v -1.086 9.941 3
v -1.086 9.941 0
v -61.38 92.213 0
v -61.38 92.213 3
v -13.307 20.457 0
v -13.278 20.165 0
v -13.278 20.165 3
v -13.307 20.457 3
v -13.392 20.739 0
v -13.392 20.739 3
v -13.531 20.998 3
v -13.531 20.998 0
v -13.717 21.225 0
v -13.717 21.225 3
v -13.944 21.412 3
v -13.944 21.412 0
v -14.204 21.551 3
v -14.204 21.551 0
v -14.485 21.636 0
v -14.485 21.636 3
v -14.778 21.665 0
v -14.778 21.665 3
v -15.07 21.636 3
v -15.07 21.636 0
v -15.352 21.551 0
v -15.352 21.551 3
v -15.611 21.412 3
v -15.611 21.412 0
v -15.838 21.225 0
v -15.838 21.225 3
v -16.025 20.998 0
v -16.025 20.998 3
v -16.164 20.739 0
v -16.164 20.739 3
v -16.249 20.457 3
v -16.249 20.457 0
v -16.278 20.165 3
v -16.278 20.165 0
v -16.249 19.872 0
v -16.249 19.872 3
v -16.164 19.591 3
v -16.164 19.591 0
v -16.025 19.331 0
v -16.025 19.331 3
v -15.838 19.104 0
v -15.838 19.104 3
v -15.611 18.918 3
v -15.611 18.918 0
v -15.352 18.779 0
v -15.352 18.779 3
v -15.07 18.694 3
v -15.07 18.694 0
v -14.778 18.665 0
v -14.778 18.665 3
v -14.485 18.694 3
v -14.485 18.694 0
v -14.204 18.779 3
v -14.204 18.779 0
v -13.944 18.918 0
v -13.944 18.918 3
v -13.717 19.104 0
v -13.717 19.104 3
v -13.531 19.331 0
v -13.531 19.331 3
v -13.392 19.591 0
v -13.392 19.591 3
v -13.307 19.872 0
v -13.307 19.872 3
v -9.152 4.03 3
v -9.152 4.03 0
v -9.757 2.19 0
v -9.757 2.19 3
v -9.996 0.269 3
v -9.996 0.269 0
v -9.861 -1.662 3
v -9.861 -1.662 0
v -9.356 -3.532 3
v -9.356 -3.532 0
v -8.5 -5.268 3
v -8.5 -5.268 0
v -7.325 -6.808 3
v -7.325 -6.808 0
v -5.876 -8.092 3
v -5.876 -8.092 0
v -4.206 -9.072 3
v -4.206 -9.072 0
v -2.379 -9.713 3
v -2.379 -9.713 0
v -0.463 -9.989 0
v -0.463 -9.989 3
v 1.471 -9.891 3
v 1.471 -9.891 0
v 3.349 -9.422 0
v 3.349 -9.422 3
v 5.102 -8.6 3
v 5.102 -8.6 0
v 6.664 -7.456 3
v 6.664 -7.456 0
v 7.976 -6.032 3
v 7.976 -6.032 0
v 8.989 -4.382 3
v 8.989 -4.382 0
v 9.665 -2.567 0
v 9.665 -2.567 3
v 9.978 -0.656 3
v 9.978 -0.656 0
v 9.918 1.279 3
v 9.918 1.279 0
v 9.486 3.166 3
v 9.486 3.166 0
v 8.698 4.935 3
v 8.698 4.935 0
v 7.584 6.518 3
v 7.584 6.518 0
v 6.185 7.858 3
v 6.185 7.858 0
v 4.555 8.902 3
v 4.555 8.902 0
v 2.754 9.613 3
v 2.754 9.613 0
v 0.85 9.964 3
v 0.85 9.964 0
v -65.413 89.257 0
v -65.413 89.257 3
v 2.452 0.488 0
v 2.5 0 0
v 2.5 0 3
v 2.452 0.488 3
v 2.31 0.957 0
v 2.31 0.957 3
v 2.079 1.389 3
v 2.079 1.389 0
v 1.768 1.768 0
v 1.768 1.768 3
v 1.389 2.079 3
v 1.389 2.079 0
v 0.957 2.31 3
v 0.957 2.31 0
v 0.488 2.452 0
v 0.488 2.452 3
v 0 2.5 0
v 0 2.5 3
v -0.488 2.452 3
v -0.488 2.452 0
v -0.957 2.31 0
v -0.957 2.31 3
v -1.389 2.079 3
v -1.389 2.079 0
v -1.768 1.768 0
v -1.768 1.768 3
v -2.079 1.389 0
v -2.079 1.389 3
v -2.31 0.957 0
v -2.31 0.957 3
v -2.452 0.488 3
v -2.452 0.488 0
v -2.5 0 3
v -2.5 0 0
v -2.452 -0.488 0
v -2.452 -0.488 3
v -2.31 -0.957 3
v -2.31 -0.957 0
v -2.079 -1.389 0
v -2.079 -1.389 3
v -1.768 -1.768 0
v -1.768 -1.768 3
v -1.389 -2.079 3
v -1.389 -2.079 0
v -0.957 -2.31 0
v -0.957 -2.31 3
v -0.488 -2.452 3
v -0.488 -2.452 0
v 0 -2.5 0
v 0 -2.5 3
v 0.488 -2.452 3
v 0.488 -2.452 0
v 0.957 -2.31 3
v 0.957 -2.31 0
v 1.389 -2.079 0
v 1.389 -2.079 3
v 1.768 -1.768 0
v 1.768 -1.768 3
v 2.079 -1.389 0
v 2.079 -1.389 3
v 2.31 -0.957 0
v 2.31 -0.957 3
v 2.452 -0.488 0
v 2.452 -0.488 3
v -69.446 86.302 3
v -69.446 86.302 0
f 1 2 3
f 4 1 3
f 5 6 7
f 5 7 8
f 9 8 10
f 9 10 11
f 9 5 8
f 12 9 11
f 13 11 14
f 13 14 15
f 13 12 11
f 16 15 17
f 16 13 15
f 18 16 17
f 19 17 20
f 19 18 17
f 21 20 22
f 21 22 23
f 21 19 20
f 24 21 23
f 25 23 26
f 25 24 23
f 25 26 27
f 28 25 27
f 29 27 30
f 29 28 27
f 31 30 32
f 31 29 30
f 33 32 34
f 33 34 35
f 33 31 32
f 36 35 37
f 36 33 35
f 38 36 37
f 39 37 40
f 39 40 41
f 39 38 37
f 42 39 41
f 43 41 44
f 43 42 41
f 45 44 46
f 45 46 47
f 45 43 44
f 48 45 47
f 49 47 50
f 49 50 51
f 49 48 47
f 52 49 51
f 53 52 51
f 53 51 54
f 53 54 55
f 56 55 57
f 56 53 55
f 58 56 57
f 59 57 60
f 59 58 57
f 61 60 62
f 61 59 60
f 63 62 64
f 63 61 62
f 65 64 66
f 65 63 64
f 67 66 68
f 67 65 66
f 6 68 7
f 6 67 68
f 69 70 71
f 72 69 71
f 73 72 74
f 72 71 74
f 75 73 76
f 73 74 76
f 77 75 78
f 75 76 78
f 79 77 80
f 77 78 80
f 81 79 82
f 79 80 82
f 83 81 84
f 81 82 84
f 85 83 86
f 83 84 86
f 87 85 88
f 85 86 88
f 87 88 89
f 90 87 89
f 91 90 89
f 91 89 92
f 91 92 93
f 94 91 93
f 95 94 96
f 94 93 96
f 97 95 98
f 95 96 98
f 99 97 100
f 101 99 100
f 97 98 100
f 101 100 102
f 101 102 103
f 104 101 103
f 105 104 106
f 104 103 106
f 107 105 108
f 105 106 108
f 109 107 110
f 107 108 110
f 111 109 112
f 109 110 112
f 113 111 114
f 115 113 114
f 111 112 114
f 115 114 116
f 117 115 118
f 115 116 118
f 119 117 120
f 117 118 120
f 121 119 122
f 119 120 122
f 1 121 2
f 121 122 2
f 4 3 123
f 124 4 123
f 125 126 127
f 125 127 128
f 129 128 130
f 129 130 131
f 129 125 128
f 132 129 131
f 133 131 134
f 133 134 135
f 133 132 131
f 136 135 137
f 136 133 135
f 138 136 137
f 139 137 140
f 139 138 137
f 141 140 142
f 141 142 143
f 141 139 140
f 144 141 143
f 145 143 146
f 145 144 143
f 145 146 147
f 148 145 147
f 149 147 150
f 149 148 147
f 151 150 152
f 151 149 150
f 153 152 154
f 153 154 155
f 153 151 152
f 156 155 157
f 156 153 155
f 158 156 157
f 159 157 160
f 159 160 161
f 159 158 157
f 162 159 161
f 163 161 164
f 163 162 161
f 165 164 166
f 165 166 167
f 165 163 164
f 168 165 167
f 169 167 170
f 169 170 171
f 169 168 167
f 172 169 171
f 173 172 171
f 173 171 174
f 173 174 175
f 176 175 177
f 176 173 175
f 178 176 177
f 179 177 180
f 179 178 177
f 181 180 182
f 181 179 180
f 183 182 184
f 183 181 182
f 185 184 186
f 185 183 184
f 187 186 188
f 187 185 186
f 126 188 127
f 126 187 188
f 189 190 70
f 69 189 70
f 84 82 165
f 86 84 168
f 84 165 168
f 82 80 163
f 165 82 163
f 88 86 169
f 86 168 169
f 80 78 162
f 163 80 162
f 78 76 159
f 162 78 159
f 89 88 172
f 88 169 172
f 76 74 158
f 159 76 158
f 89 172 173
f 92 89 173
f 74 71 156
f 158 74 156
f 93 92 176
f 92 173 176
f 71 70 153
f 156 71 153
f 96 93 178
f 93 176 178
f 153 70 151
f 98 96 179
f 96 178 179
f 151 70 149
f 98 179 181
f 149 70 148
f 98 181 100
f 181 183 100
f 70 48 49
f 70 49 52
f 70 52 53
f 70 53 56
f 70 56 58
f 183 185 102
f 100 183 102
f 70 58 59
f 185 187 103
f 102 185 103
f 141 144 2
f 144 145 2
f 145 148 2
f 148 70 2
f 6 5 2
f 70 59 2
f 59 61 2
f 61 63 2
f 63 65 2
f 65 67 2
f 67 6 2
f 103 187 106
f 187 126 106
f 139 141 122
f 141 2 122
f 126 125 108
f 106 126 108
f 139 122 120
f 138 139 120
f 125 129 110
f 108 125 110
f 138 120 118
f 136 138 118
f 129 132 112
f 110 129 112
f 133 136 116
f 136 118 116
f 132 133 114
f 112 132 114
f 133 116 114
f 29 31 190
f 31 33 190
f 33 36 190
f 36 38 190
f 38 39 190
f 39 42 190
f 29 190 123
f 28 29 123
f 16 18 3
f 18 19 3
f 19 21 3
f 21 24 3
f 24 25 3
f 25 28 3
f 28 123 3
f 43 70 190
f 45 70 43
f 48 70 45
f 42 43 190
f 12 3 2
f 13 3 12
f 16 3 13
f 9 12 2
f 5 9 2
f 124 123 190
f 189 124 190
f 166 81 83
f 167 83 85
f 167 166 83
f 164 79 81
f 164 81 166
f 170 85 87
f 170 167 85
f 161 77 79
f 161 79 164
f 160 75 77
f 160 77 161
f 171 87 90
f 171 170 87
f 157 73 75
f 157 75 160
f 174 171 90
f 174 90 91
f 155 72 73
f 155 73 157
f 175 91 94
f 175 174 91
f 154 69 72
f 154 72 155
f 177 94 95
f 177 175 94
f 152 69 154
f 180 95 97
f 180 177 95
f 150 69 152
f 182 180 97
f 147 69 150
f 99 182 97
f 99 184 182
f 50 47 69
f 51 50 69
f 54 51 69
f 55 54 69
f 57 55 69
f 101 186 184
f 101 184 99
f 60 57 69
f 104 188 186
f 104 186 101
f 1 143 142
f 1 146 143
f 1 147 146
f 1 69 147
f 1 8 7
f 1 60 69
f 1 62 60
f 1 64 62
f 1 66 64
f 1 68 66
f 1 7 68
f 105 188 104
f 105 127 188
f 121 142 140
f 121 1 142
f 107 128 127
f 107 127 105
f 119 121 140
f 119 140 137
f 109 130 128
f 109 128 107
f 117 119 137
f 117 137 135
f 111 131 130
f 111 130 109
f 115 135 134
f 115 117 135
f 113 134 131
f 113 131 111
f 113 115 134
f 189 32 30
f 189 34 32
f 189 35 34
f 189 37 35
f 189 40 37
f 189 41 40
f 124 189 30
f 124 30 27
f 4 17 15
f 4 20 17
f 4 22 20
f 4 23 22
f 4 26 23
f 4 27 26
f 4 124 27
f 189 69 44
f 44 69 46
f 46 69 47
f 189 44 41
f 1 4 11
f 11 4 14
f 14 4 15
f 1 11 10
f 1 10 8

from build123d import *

# Parameters (mm, degrees)
SKETCH1_R           = 2.5
SKETCH1_R_2         = 1.500000002
BOSS_EXTRUDE1_DEPTH = 3


with BuildPart() as part:
    # Sketch1 → Boss-Extrude1 (new body)
    with BuildSketch(Plane.XY):
        with BuildLine():
            Line((-65.41272675, 89.25730784), (-69.445670133, 86.301742297))
            Line((-69.445670133, 86.301742297), (-9.152133067, 4.0296973))
            ThreePointArc((-9.152133067, 4.0296973), (5.911131085, -8.065886764), (-1.086246302, 9.940828385))
            Line((-1.086246302, 9.940828385), (-61.379783368, 92.212873382))
            Line((-61.379783368, 92.212873382), (-65.41272675, 89.25730784))
        make_face()
        Circle(SKETCH1_R, mode=Mode.SUBTRACT)
        with Locations((-14.777827712, 20.164716911)):
            Circle(SKETCH1_R_2, mode=Mode.SUBTRACT)
    extrude(amount=BOSS_EXTRUDE1_DEPTH)


solid = part.part
